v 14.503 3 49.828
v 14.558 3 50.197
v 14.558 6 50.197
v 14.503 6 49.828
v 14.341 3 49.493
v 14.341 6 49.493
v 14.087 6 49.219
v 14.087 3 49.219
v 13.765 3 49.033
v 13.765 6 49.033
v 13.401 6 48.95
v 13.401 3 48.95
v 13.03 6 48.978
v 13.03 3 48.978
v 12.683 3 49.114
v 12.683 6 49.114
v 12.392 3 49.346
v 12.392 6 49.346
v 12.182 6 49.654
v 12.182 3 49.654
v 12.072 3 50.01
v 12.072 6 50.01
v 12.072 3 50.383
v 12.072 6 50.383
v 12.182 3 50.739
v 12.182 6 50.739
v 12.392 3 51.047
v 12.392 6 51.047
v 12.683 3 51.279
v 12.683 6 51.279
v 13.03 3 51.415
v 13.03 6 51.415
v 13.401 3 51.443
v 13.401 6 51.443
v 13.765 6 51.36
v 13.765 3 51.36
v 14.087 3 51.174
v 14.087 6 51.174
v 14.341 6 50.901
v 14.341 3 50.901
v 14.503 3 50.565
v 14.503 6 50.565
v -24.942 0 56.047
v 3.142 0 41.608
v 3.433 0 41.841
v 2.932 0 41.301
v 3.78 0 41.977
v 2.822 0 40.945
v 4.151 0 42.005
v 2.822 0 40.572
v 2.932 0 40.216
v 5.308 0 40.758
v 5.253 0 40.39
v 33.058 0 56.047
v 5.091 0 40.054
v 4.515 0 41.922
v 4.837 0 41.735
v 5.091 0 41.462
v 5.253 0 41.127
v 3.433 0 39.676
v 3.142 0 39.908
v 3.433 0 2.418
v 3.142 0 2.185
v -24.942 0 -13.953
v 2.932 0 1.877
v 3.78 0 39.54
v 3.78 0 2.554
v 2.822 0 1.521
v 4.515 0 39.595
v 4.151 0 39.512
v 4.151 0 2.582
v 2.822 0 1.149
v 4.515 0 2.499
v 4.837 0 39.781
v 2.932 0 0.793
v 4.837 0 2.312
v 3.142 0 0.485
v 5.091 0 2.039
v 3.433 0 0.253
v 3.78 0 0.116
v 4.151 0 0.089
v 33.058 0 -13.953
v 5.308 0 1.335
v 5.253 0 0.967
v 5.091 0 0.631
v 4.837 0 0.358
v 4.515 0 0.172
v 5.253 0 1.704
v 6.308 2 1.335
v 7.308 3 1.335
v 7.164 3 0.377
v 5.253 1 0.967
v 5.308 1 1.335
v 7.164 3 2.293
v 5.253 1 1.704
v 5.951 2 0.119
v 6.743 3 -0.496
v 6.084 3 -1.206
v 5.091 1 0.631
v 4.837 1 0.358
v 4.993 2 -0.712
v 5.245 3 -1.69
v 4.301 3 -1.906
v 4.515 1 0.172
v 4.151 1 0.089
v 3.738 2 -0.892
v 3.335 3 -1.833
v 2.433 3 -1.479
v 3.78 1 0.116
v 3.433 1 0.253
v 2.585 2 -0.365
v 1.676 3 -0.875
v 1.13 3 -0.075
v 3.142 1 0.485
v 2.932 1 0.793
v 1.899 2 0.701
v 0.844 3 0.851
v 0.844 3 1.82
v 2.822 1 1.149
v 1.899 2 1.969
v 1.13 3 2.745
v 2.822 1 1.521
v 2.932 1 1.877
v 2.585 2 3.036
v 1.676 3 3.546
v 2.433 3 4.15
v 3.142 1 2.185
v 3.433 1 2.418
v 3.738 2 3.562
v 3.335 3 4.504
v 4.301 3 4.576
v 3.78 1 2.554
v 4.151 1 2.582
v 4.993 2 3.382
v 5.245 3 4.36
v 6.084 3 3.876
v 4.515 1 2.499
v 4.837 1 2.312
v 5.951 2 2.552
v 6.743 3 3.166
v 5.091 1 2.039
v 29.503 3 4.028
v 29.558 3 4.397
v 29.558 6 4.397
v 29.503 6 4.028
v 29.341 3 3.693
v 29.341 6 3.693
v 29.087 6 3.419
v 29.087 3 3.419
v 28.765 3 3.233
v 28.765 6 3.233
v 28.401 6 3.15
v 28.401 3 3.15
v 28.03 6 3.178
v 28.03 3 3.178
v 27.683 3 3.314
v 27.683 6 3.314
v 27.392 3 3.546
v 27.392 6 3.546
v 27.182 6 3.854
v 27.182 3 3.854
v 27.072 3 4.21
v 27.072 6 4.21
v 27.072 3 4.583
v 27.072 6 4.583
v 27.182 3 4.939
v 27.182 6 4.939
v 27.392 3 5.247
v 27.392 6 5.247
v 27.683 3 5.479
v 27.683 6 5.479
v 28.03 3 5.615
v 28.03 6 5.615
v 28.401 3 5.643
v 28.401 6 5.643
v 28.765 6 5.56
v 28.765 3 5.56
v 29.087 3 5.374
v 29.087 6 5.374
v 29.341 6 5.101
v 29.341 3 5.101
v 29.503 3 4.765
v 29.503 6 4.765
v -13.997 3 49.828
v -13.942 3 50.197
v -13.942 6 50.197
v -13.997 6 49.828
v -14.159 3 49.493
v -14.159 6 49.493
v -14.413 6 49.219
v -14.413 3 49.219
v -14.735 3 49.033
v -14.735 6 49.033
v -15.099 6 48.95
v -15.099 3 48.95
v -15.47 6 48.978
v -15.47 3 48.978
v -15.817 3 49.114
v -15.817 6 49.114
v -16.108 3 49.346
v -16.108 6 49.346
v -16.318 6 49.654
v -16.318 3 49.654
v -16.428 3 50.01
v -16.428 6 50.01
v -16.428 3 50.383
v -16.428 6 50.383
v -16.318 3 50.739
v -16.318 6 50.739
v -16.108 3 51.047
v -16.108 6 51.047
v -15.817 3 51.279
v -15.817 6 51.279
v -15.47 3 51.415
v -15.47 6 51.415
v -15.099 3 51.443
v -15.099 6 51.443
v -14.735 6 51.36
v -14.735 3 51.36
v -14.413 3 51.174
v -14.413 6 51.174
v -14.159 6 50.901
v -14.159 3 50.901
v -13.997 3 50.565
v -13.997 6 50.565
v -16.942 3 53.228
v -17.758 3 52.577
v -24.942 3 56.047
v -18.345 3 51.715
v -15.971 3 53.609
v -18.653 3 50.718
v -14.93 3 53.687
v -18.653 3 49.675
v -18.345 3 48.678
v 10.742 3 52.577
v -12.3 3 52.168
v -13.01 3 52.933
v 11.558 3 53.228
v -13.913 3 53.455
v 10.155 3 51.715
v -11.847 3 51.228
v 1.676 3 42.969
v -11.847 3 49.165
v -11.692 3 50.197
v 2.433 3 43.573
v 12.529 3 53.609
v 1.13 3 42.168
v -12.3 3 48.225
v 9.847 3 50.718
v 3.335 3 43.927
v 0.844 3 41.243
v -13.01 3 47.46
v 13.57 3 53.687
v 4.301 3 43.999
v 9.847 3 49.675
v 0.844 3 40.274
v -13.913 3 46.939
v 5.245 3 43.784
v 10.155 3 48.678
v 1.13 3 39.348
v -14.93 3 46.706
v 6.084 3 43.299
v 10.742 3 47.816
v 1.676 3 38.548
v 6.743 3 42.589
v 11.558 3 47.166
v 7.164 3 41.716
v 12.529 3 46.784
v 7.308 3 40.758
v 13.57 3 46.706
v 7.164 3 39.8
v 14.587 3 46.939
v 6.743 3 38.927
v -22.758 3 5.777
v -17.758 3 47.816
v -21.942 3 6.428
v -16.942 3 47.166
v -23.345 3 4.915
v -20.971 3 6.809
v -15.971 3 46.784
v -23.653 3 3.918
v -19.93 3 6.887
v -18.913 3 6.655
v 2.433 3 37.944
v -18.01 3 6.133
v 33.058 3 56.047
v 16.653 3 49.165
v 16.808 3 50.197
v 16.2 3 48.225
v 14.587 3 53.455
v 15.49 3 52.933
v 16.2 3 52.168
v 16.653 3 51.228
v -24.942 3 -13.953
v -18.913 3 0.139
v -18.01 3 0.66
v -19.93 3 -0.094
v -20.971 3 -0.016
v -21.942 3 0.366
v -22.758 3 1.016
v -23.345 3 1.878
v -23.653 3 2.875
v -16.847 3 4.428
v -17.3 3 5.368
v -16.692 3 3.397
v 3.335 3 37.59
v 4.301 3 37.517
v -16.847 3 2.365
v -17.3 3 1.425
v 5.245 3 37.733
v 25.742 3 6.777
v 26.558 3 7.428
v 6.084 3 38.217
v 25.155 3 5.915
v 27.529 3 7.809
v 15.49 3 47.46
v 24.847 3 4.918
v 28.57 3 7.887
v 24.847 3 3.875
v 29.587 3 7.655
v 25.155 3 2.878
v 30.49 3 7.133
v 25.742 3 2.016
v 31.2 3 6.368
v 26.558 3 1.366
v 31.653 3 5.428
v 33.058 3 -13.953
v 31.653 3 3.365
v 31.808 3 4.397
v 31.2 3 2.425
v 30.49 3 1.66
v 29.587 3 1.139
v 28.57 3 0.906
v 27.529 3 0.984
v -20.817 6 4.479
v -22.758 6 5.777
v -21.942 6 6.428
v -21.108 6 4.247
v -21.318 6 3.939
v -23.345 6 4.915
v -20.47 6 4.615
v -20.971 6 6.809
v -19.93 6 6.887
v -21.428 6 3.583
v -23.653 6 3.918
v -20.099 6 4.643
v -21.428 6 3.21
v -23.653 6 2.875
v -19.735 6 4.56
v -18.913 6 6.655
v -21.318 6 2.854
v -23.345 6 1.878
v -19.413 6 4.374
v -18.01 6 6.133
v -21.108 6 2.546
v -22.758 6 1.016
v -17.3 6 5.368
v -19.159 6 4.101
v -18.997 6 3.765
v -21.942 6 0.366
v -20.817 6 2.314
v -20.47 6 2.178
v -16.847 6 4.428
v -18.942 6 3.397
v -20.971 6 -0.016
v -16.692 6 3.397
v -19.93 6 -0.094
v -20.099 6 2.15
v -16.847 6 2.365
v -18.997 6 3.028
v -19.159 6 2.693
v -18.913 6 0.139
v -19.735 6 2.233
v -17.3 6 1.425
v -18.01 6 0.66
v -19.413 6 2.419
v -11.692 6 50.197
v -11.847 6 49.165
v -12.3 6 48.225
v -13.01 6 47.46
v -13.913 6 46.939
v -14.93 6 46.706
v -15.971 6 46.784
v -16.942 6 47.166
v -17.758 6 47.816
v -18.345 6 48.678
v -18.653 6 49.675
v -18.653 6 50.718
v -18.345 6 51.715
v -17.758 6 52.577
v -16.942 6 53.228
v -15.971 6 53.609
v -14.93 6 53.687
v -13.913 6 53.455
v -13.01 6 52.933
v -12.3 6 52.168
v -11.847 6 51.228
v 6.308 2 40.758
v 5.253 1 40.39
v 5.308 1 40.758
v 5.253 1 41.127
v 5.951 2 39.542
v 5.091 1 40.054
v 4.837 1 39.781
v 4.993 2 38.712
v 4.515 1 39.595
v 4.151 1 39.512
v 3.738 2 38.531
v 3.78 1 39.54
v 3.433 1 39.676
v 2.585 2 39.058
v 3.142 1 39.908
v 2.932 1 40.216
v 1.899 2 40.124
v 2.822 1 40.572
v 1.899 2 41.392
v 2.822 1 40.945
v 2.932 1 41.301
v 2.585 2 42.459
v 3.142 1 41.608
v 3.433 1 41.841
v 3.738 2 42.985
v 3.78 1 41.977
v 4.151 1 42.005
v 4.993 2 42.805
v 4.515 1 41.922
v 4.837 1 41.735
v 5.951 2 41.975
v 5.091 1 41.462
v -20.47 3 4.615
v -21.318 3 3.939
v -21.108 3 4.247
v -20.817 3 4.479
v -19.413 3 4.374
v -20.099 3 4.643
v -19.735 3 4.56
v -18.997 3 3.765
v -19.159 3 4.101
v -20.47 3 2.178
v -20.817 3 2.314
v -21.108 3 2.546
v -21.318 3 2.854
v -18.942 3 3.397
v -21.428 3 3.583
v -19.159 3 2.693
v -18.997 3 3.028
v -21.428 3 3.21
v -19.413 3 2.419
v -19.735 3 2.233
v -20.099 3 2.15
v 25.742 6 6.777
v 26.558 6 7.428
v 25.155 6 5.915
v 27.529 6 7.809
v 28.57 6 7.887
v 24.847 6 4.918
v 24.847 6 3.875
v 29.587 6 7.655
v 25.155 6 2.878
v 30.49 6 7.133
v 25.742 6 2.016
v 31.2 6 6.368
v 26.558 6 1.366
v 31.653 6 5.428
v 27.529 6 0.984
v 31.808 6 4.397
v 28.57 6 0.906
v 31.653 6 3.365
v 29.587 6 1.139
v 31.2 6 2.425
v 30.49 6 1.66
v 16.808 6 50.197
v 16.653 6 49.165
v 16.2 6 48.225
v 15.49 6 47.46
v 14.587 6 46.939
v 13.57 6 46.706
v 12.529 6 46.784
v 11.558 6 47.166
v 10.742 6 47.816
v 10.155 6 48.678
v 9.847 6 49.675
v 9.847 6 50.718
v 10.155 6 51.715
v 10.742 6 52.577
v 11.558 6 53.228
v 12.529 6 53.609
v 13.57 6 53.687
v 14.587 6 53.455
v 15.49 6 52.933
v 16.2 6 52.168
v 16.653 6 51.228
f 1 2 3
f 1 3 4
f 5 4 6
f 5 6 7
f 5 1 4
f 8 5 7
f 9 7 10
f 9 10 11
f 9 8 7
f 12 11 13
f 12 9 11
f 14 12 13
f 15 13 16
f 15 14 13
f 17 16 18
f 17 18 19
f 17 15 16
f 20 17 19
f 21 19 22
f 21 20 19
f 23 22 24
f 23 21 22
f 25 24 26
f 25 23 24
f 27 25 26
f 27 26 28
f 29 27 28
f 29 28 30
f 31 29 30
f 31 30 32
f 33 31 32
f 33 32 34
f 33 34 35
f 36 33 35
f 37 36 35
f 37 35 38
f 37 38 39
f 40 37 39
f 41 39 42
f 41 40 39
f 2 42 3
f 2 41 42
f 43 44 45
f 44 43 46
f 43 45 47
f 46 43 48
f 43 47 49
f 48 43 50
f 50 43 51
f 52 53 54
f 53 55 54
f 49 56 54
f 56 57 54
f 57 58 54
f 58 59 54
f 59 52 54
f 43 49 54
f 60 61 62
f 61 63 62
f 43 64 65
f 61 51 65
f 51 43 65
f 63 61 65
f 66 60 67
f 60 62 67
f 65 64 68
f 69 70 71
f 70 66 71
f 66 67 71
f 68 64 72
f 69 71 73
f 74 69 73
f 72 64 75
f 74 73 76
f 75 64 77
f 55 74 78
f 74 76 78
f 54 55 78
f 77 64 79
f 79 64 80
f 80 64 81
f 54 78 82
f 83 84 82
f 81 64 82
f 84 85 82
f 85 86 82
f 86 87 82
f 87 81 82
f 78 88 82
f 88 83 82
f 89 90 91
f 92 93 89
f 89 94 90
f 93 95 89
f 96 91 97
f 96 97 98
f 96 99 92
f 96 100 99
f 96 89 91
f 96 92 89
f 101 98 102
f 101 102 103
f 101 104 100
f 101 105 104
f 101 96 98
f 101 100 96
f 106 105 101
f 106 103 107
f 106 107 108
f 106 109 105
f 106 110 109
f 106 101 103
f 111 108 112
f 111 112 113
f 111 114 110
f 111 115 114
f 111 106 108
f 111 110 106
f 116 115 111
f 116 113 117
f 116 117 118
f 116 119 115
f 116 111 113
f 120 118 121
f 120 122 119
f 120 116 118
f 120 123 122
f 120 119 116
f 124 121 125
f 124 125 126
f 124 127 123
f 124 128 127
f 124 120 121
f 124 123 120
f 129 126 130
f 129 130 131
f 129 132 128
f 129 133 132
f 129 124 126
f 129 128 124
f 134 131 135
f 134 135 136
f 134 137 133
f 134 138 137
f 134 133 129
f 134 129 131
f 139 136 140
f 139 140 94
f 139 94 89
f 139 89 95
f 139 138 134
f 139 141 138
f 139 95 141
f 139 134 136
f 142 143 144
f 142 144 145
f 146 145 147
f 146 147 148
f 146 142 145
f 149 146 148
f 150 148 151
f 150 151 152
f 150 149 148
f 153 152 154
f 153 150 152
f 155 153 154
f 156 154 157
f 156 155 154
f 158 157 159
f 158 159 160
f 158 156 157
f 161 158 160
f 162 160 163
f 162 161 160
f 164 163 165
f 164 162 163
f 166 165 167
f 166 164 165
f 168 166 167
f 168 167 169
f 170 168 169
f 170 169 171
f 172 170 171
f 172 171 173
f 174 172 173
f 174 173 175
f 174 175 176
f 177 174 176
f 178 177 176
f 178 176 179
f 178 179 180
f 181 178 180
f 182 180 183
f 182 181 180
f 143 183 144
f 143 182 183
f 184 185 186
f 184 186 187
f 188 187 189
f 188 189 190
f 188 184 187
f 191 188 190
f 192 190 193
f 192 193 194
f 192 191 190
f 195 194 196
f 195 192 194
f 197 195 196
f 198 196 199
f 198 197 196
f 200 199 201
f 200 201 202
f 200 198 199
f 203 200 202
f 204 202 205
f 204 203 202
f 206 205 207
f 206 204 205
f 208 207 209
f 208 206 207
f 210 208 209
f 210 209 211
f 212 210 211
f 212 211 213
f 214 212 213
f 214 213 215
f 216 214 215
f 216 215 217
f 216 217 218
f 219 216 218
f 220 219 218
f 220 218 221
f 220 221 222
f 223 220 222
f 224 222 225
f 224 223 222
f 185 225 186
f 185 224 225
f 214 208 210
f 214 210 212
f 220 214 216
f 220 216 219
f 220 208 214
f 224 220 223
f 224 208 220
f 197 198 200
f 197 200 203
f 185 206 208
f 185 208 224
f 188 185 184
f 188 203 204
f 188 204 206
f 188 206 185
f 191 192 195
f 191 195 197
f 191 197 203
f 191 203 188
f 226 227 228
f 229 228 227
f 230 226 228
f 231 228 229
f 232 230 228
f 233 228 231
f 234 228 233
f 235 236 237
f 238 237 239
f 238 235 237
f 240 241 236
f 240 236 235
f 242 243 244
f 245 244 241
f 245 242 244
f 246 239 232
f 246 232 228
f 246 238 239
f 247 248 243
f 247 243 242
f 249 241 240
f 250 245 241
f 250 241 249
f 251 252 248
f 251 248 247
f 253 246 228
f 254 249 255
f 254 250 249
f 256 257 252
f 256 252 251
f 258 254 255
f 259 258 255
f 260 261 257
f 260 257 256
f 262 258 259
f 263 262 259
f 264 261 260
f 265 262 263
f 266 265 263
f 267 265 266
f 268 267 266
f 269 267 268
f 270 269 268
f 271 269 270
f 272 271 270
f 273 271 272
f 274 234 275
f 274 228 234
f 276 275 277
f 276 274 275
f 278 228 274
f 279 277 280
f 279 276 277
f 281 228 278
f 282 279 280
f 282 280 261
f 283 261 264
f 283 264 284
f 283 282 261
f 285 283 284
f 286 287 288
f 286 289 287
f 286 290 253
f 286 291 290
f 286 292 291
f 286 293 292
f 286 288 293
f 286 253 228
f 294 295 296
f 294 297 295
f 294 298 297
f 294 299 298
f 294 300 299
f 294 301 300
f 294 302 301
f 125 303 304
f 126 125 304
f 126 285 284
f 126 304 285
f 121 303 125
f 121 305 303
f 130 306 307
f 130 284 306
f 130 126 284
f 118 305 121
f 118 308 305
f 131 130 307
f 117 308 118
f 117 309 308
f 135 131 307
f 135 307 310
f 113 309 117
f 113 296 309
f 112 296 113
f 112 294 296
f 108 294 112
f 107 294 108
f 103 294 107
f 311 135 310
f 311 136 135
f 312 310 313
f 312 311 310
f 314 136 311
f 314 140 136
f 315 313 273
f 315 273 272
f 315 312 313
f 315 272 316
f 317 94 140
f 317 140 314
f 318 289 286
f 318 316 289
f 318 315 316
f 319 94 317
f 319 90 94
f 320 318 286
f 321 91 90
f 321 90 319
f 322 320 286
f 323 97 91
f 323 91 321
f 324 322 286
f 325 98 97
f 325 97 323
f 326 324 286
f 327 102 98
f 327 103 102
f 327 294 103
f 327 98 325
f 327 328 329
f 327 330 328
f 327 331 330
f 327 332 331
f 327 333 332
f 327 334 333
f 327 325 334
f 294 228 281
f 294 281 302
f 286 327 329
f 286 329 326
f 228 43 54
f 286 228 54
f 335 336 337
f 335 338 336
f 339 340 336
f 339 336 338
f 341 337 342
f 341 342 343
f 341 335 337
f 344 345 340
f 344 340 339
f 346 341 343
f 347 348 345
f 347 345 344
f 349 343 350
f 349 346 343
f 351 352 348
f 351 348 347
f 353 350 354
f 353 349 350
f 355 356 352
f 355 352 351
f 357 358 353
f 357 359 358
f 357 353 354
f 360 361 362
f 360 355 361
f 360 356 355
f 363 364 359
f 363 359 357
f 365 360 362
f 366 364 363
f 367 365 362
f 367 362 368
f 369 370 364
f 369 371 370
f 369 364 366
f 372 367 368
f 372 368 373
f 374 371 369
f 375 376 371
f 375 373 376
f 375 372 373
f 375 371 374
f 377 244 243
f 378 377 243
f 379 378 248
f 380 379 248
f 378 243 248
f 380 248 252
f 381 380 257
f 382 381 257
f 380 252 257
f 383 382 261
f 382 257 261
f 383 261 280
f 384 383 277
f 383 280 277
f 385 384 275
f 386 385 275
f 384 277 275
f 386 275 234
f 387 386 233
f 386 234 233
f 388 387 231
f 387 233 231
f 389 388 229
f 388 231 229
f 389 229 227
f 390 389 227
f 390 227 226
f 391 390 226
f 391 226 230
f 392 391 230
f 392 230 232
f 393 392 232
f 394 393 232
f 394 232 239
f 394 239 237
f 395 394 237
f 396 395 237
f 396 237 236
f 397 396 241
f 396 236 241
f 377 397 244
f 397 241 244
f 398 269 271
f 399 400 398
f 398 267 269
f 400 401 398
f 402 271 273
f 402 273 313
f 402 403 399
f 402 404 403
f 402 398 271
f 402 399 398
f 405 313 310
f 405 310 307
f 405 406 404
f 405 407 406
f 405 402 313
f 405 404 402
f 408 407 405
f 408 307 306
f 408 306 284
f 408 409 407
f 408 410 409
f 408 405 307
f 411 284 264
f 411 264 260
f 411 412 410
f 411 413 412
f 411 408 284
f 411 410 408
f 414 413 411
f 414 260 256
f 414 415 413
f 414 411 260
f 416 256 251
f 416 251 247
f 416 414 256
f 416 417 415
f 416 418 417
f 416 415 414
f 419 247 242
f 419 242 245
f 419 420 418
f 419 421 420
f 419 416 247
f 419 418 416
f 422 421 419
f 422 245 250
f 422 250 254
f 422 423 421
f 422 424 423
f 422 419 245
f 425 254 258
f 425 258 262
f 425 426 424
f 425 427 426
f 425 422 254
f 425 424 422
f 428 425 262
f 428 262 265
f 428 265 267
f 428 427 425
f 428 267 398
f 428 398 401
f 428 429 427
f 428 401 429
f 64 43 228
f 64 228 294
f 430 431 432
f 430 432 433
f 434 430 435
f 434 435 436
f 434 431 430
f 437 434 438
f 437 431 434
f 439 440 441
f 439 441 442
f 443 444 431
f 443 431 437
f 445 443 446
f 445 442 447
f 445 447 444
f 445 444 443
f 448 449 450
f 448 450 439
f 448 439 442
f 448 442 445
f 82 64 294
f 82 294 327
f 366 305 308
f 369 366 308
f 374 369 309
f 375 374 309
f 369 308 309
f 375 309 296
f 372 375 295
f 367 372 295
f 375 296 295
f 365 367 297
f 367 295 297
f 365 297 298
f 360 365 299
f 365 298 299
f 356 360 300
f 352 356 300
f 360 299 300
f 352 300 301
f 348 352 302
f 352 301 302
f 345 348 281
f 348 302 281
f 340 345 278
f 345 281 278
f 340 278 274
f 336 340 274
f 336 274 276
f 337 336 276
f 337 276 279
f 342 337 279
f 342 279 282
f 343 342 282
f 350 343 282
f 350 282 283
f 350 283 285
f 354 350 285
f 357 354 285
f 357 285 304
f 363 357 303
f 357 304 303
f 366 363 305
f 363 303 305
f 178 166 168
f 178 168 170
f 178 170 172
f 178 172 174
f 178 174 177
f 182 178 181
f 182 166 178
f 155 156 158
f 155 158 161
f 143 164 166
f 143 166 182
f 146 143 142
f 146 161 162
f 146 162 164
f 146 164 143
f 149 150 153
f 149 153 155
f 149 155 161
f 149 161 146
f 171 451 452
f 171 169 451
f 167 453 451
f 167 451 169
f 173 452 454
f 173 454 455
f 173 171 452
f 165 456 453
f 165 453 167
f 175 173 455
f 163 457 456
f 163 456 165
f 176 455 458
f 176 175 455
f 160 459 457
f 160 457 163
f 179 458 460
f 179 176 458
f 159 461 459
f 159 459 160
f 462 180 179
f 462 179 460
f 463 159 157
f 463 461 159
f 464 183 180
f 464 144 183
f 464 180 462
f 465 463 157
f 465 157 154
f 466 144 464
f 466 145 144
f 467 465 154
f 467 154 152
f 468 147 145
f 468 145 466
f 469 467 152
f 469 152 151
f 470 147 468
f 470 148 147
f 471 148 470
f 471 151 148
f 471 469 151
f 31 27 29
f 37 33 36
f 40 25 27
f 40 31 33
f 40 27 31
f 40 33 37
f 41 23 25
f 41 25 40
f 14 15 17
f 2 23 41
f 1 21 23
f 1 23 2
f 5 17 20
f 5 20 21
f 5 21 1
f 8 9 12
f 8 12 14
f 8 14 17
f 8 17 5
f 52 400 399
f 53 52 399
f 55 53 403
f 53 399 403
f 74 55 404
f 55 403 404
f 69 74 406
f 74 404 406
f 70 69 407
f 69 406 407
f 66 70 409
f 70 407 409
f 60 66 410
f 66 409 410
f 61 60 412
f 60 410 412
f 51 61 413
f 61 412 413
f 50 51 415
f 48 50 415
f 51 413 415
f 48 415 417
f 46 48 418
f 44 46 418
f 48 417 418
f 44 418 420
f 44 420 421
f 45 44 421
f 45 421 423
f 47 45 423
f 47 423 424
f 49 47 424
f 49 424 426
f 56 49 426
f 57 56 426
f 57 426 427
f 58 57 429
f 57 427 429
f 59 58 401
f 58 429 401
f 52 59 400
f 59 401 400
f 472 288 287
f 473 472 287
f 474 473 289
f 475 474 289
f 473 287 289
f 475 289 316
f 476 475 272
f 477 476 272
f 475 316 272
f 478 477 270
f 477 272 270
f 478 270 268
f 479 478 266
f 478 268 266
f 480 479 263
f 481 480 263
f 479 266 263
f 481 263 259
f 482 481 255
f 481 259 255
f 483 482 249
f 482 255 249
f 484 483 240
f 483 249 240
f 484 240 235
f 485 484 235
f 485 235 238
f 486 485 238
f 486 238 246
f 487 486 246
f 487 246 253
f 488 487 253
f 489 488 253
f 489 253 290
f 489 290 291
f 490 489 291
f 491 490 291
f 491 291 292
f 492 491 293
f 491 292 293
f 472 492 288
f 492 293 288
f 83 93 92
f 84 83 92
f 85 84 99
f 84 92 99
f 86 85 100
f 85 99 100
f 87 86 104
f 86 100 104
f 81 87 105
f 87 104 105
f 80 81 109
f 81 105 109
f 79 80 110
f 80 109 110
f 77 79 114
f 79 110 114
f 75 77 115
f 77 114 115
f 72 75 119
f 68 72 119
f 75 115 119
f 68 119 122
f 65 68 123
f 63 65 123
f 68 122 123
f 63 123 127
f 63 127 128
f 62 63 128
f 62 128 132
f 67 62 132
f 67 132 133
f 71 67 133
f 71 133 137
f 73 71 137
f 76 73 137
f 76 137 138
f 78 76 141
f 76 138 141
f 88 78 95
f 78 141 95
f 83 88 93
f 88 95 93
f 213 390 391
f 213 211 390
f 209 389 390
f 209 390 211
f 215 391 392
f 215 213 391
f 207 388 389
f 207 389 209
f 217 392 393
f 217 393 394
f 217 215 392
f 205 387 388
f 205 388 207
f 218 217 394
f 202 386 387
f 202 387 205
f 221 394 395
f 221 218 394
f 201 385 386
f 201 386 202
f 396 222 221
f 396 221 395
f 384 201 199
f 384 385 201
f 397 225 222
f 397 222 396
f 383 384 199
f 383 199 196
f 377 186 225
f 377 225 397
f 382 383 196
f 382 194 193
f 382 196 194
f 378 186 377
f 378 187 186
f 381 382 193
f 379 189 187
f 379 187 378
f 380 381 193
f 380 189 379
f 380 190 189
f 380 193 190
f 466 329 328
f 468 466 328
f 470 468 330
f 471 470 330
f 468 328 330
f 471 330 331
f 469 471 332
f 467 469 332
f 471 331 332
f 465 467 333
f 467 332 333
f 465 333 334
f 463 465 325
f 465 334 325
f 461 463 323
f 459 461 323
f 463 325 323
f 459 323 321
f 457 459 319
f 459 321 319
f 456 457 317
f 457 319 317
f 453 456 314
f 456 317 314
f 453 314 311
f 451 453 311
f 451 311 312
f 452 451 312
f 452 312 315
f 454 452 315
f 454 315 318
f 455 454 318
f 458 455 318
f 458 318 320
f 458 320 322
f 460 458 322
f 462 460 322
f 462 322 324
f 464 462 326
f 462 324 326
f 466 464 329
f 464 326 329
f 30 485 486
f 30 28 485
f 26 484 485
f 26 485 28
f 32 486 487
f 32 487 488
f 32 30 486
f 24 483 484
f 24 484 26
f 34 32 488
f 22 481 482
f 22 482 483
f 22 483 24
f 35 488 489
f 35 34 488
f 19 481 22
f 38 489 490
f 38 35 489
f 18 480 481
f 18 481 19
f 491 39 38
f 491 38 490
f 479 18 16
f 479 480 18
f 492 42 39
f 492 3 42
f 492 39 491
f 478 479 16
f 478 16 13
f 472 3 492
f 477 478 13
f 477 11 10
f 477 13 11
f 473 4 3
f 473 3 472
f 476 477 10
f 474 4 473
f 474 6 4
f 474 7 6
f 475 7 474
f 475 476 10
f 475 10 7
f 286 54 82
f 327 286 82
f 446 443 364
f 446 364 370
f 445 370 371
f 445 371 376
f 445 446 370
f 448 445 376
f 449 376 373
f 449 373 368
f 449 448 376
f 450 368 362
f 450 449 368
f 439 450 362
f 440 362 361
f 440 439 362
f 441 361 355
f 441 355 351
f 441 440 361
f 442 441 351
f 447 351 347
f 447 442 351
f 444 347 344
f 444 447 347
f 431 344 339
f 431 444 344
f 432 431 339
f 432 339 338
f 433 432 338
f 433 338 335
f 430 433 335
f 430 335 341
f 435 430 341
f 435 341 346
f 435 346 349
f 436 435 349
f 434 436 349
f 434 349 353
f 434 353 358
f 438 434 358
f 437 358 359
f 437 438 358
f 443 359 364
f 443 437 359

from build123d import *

# Parameters (mm, degrees)
SKETCH_1_W          = 58
SKETCH_1_H          = 70
EXTRUDE_1_DEPTH     = 3
SKETCH_2_R          = 3.5
SKETCH_2_R_2        = 1.25
EXTRUDE_2_DEPTH     = 3
SKETCH_3_R          = 1.25
CUT_EXTRUDE_1_DEPTH = 3
CHAMFER_1_SIZE      = 2


with BuildPart() as part:
    # Эскиз1 → Бобышка-Вытянуть1 (new body)
    with BuildSketch(Plane(origin=(0, 0, 0), x_dir=(1, 0, 0), z_dir=(0, 1, 0))):
        with Locations((4.058065061, -21.04666133)):
            Rectangle(SKETCH_1_W, SKETCH_1_H)
    extrude(amount=EXTRUDE_1_DEPTH)

    # Эскиз2 → Бобышка-Вытянуть2 (add)
    with BuildSketch(Plane(origin=(0, 3, 0), x_dir=(1, 0, 0), z_dir=(0, 1, 0))):
        with Locations((28.308065061, -4.39666133)):
            Circle(SKETCH_2_R)
        with Locations((28.308065061, -4.39666133)):
            Circle(SKETCH_2_R_2, mode=Mode.SUBTRACT)
        with Locations((-20.191934939, -3.39666133)):
            Circle(SKETCH_2_R)
        with Locations((-20.191934939, -3.39666133)):
            Circle(SKETCH_2_R_2, mode=Mode.SUBTRACT)
        with Locations((-15.191934939, -50.19666133)):
            Circle(SKETCH_2_R)
        with Locations((-15.191934939, -50.19666133)):
            Circle(SKETCH_2_R_2, mode=Mode.SUBTRACT)
        with Locations((13.308065061, -50.19666133)):
            Circle(SKETCH_2_R)
        with Locations((13.308065061, -50.19666133)):
            Circle(SKETCH_2_R_2, mode=Mode.SUBTRACT)
    extrude(amount=EXTRUDE_2_DEPTH)

    # Эскиз3 → Вырез-Вытянуть1 (cut)
    with BuildSketch(Plane(origin=(0, 3, 0), x_dir=(1, 0, 0), z_dir=(0, 1, 0))):
        with Locations((4.058065061, -1.335122264)):
            Circle(SKETCH_3_R)
        with Locations((4.058065061, -40.758200397)):
            Circle(SKETCH_3_R)
    extrude(amount=-CUT_EXTRUDE_1_DEPTH, mode=Mode.SUBTRACT)

    # Фаска1
    chamfer_1_edges = [part.edges().sort_by_distance(p)[0] for p in [
        (2.808065061, 3, 1.335122264),
        (2.808065061, 3, 40.758200397),
    ]]
    chamfer(chamfer_1_edges, length=CHAMFER_1_SIZE)


solid = part.part
